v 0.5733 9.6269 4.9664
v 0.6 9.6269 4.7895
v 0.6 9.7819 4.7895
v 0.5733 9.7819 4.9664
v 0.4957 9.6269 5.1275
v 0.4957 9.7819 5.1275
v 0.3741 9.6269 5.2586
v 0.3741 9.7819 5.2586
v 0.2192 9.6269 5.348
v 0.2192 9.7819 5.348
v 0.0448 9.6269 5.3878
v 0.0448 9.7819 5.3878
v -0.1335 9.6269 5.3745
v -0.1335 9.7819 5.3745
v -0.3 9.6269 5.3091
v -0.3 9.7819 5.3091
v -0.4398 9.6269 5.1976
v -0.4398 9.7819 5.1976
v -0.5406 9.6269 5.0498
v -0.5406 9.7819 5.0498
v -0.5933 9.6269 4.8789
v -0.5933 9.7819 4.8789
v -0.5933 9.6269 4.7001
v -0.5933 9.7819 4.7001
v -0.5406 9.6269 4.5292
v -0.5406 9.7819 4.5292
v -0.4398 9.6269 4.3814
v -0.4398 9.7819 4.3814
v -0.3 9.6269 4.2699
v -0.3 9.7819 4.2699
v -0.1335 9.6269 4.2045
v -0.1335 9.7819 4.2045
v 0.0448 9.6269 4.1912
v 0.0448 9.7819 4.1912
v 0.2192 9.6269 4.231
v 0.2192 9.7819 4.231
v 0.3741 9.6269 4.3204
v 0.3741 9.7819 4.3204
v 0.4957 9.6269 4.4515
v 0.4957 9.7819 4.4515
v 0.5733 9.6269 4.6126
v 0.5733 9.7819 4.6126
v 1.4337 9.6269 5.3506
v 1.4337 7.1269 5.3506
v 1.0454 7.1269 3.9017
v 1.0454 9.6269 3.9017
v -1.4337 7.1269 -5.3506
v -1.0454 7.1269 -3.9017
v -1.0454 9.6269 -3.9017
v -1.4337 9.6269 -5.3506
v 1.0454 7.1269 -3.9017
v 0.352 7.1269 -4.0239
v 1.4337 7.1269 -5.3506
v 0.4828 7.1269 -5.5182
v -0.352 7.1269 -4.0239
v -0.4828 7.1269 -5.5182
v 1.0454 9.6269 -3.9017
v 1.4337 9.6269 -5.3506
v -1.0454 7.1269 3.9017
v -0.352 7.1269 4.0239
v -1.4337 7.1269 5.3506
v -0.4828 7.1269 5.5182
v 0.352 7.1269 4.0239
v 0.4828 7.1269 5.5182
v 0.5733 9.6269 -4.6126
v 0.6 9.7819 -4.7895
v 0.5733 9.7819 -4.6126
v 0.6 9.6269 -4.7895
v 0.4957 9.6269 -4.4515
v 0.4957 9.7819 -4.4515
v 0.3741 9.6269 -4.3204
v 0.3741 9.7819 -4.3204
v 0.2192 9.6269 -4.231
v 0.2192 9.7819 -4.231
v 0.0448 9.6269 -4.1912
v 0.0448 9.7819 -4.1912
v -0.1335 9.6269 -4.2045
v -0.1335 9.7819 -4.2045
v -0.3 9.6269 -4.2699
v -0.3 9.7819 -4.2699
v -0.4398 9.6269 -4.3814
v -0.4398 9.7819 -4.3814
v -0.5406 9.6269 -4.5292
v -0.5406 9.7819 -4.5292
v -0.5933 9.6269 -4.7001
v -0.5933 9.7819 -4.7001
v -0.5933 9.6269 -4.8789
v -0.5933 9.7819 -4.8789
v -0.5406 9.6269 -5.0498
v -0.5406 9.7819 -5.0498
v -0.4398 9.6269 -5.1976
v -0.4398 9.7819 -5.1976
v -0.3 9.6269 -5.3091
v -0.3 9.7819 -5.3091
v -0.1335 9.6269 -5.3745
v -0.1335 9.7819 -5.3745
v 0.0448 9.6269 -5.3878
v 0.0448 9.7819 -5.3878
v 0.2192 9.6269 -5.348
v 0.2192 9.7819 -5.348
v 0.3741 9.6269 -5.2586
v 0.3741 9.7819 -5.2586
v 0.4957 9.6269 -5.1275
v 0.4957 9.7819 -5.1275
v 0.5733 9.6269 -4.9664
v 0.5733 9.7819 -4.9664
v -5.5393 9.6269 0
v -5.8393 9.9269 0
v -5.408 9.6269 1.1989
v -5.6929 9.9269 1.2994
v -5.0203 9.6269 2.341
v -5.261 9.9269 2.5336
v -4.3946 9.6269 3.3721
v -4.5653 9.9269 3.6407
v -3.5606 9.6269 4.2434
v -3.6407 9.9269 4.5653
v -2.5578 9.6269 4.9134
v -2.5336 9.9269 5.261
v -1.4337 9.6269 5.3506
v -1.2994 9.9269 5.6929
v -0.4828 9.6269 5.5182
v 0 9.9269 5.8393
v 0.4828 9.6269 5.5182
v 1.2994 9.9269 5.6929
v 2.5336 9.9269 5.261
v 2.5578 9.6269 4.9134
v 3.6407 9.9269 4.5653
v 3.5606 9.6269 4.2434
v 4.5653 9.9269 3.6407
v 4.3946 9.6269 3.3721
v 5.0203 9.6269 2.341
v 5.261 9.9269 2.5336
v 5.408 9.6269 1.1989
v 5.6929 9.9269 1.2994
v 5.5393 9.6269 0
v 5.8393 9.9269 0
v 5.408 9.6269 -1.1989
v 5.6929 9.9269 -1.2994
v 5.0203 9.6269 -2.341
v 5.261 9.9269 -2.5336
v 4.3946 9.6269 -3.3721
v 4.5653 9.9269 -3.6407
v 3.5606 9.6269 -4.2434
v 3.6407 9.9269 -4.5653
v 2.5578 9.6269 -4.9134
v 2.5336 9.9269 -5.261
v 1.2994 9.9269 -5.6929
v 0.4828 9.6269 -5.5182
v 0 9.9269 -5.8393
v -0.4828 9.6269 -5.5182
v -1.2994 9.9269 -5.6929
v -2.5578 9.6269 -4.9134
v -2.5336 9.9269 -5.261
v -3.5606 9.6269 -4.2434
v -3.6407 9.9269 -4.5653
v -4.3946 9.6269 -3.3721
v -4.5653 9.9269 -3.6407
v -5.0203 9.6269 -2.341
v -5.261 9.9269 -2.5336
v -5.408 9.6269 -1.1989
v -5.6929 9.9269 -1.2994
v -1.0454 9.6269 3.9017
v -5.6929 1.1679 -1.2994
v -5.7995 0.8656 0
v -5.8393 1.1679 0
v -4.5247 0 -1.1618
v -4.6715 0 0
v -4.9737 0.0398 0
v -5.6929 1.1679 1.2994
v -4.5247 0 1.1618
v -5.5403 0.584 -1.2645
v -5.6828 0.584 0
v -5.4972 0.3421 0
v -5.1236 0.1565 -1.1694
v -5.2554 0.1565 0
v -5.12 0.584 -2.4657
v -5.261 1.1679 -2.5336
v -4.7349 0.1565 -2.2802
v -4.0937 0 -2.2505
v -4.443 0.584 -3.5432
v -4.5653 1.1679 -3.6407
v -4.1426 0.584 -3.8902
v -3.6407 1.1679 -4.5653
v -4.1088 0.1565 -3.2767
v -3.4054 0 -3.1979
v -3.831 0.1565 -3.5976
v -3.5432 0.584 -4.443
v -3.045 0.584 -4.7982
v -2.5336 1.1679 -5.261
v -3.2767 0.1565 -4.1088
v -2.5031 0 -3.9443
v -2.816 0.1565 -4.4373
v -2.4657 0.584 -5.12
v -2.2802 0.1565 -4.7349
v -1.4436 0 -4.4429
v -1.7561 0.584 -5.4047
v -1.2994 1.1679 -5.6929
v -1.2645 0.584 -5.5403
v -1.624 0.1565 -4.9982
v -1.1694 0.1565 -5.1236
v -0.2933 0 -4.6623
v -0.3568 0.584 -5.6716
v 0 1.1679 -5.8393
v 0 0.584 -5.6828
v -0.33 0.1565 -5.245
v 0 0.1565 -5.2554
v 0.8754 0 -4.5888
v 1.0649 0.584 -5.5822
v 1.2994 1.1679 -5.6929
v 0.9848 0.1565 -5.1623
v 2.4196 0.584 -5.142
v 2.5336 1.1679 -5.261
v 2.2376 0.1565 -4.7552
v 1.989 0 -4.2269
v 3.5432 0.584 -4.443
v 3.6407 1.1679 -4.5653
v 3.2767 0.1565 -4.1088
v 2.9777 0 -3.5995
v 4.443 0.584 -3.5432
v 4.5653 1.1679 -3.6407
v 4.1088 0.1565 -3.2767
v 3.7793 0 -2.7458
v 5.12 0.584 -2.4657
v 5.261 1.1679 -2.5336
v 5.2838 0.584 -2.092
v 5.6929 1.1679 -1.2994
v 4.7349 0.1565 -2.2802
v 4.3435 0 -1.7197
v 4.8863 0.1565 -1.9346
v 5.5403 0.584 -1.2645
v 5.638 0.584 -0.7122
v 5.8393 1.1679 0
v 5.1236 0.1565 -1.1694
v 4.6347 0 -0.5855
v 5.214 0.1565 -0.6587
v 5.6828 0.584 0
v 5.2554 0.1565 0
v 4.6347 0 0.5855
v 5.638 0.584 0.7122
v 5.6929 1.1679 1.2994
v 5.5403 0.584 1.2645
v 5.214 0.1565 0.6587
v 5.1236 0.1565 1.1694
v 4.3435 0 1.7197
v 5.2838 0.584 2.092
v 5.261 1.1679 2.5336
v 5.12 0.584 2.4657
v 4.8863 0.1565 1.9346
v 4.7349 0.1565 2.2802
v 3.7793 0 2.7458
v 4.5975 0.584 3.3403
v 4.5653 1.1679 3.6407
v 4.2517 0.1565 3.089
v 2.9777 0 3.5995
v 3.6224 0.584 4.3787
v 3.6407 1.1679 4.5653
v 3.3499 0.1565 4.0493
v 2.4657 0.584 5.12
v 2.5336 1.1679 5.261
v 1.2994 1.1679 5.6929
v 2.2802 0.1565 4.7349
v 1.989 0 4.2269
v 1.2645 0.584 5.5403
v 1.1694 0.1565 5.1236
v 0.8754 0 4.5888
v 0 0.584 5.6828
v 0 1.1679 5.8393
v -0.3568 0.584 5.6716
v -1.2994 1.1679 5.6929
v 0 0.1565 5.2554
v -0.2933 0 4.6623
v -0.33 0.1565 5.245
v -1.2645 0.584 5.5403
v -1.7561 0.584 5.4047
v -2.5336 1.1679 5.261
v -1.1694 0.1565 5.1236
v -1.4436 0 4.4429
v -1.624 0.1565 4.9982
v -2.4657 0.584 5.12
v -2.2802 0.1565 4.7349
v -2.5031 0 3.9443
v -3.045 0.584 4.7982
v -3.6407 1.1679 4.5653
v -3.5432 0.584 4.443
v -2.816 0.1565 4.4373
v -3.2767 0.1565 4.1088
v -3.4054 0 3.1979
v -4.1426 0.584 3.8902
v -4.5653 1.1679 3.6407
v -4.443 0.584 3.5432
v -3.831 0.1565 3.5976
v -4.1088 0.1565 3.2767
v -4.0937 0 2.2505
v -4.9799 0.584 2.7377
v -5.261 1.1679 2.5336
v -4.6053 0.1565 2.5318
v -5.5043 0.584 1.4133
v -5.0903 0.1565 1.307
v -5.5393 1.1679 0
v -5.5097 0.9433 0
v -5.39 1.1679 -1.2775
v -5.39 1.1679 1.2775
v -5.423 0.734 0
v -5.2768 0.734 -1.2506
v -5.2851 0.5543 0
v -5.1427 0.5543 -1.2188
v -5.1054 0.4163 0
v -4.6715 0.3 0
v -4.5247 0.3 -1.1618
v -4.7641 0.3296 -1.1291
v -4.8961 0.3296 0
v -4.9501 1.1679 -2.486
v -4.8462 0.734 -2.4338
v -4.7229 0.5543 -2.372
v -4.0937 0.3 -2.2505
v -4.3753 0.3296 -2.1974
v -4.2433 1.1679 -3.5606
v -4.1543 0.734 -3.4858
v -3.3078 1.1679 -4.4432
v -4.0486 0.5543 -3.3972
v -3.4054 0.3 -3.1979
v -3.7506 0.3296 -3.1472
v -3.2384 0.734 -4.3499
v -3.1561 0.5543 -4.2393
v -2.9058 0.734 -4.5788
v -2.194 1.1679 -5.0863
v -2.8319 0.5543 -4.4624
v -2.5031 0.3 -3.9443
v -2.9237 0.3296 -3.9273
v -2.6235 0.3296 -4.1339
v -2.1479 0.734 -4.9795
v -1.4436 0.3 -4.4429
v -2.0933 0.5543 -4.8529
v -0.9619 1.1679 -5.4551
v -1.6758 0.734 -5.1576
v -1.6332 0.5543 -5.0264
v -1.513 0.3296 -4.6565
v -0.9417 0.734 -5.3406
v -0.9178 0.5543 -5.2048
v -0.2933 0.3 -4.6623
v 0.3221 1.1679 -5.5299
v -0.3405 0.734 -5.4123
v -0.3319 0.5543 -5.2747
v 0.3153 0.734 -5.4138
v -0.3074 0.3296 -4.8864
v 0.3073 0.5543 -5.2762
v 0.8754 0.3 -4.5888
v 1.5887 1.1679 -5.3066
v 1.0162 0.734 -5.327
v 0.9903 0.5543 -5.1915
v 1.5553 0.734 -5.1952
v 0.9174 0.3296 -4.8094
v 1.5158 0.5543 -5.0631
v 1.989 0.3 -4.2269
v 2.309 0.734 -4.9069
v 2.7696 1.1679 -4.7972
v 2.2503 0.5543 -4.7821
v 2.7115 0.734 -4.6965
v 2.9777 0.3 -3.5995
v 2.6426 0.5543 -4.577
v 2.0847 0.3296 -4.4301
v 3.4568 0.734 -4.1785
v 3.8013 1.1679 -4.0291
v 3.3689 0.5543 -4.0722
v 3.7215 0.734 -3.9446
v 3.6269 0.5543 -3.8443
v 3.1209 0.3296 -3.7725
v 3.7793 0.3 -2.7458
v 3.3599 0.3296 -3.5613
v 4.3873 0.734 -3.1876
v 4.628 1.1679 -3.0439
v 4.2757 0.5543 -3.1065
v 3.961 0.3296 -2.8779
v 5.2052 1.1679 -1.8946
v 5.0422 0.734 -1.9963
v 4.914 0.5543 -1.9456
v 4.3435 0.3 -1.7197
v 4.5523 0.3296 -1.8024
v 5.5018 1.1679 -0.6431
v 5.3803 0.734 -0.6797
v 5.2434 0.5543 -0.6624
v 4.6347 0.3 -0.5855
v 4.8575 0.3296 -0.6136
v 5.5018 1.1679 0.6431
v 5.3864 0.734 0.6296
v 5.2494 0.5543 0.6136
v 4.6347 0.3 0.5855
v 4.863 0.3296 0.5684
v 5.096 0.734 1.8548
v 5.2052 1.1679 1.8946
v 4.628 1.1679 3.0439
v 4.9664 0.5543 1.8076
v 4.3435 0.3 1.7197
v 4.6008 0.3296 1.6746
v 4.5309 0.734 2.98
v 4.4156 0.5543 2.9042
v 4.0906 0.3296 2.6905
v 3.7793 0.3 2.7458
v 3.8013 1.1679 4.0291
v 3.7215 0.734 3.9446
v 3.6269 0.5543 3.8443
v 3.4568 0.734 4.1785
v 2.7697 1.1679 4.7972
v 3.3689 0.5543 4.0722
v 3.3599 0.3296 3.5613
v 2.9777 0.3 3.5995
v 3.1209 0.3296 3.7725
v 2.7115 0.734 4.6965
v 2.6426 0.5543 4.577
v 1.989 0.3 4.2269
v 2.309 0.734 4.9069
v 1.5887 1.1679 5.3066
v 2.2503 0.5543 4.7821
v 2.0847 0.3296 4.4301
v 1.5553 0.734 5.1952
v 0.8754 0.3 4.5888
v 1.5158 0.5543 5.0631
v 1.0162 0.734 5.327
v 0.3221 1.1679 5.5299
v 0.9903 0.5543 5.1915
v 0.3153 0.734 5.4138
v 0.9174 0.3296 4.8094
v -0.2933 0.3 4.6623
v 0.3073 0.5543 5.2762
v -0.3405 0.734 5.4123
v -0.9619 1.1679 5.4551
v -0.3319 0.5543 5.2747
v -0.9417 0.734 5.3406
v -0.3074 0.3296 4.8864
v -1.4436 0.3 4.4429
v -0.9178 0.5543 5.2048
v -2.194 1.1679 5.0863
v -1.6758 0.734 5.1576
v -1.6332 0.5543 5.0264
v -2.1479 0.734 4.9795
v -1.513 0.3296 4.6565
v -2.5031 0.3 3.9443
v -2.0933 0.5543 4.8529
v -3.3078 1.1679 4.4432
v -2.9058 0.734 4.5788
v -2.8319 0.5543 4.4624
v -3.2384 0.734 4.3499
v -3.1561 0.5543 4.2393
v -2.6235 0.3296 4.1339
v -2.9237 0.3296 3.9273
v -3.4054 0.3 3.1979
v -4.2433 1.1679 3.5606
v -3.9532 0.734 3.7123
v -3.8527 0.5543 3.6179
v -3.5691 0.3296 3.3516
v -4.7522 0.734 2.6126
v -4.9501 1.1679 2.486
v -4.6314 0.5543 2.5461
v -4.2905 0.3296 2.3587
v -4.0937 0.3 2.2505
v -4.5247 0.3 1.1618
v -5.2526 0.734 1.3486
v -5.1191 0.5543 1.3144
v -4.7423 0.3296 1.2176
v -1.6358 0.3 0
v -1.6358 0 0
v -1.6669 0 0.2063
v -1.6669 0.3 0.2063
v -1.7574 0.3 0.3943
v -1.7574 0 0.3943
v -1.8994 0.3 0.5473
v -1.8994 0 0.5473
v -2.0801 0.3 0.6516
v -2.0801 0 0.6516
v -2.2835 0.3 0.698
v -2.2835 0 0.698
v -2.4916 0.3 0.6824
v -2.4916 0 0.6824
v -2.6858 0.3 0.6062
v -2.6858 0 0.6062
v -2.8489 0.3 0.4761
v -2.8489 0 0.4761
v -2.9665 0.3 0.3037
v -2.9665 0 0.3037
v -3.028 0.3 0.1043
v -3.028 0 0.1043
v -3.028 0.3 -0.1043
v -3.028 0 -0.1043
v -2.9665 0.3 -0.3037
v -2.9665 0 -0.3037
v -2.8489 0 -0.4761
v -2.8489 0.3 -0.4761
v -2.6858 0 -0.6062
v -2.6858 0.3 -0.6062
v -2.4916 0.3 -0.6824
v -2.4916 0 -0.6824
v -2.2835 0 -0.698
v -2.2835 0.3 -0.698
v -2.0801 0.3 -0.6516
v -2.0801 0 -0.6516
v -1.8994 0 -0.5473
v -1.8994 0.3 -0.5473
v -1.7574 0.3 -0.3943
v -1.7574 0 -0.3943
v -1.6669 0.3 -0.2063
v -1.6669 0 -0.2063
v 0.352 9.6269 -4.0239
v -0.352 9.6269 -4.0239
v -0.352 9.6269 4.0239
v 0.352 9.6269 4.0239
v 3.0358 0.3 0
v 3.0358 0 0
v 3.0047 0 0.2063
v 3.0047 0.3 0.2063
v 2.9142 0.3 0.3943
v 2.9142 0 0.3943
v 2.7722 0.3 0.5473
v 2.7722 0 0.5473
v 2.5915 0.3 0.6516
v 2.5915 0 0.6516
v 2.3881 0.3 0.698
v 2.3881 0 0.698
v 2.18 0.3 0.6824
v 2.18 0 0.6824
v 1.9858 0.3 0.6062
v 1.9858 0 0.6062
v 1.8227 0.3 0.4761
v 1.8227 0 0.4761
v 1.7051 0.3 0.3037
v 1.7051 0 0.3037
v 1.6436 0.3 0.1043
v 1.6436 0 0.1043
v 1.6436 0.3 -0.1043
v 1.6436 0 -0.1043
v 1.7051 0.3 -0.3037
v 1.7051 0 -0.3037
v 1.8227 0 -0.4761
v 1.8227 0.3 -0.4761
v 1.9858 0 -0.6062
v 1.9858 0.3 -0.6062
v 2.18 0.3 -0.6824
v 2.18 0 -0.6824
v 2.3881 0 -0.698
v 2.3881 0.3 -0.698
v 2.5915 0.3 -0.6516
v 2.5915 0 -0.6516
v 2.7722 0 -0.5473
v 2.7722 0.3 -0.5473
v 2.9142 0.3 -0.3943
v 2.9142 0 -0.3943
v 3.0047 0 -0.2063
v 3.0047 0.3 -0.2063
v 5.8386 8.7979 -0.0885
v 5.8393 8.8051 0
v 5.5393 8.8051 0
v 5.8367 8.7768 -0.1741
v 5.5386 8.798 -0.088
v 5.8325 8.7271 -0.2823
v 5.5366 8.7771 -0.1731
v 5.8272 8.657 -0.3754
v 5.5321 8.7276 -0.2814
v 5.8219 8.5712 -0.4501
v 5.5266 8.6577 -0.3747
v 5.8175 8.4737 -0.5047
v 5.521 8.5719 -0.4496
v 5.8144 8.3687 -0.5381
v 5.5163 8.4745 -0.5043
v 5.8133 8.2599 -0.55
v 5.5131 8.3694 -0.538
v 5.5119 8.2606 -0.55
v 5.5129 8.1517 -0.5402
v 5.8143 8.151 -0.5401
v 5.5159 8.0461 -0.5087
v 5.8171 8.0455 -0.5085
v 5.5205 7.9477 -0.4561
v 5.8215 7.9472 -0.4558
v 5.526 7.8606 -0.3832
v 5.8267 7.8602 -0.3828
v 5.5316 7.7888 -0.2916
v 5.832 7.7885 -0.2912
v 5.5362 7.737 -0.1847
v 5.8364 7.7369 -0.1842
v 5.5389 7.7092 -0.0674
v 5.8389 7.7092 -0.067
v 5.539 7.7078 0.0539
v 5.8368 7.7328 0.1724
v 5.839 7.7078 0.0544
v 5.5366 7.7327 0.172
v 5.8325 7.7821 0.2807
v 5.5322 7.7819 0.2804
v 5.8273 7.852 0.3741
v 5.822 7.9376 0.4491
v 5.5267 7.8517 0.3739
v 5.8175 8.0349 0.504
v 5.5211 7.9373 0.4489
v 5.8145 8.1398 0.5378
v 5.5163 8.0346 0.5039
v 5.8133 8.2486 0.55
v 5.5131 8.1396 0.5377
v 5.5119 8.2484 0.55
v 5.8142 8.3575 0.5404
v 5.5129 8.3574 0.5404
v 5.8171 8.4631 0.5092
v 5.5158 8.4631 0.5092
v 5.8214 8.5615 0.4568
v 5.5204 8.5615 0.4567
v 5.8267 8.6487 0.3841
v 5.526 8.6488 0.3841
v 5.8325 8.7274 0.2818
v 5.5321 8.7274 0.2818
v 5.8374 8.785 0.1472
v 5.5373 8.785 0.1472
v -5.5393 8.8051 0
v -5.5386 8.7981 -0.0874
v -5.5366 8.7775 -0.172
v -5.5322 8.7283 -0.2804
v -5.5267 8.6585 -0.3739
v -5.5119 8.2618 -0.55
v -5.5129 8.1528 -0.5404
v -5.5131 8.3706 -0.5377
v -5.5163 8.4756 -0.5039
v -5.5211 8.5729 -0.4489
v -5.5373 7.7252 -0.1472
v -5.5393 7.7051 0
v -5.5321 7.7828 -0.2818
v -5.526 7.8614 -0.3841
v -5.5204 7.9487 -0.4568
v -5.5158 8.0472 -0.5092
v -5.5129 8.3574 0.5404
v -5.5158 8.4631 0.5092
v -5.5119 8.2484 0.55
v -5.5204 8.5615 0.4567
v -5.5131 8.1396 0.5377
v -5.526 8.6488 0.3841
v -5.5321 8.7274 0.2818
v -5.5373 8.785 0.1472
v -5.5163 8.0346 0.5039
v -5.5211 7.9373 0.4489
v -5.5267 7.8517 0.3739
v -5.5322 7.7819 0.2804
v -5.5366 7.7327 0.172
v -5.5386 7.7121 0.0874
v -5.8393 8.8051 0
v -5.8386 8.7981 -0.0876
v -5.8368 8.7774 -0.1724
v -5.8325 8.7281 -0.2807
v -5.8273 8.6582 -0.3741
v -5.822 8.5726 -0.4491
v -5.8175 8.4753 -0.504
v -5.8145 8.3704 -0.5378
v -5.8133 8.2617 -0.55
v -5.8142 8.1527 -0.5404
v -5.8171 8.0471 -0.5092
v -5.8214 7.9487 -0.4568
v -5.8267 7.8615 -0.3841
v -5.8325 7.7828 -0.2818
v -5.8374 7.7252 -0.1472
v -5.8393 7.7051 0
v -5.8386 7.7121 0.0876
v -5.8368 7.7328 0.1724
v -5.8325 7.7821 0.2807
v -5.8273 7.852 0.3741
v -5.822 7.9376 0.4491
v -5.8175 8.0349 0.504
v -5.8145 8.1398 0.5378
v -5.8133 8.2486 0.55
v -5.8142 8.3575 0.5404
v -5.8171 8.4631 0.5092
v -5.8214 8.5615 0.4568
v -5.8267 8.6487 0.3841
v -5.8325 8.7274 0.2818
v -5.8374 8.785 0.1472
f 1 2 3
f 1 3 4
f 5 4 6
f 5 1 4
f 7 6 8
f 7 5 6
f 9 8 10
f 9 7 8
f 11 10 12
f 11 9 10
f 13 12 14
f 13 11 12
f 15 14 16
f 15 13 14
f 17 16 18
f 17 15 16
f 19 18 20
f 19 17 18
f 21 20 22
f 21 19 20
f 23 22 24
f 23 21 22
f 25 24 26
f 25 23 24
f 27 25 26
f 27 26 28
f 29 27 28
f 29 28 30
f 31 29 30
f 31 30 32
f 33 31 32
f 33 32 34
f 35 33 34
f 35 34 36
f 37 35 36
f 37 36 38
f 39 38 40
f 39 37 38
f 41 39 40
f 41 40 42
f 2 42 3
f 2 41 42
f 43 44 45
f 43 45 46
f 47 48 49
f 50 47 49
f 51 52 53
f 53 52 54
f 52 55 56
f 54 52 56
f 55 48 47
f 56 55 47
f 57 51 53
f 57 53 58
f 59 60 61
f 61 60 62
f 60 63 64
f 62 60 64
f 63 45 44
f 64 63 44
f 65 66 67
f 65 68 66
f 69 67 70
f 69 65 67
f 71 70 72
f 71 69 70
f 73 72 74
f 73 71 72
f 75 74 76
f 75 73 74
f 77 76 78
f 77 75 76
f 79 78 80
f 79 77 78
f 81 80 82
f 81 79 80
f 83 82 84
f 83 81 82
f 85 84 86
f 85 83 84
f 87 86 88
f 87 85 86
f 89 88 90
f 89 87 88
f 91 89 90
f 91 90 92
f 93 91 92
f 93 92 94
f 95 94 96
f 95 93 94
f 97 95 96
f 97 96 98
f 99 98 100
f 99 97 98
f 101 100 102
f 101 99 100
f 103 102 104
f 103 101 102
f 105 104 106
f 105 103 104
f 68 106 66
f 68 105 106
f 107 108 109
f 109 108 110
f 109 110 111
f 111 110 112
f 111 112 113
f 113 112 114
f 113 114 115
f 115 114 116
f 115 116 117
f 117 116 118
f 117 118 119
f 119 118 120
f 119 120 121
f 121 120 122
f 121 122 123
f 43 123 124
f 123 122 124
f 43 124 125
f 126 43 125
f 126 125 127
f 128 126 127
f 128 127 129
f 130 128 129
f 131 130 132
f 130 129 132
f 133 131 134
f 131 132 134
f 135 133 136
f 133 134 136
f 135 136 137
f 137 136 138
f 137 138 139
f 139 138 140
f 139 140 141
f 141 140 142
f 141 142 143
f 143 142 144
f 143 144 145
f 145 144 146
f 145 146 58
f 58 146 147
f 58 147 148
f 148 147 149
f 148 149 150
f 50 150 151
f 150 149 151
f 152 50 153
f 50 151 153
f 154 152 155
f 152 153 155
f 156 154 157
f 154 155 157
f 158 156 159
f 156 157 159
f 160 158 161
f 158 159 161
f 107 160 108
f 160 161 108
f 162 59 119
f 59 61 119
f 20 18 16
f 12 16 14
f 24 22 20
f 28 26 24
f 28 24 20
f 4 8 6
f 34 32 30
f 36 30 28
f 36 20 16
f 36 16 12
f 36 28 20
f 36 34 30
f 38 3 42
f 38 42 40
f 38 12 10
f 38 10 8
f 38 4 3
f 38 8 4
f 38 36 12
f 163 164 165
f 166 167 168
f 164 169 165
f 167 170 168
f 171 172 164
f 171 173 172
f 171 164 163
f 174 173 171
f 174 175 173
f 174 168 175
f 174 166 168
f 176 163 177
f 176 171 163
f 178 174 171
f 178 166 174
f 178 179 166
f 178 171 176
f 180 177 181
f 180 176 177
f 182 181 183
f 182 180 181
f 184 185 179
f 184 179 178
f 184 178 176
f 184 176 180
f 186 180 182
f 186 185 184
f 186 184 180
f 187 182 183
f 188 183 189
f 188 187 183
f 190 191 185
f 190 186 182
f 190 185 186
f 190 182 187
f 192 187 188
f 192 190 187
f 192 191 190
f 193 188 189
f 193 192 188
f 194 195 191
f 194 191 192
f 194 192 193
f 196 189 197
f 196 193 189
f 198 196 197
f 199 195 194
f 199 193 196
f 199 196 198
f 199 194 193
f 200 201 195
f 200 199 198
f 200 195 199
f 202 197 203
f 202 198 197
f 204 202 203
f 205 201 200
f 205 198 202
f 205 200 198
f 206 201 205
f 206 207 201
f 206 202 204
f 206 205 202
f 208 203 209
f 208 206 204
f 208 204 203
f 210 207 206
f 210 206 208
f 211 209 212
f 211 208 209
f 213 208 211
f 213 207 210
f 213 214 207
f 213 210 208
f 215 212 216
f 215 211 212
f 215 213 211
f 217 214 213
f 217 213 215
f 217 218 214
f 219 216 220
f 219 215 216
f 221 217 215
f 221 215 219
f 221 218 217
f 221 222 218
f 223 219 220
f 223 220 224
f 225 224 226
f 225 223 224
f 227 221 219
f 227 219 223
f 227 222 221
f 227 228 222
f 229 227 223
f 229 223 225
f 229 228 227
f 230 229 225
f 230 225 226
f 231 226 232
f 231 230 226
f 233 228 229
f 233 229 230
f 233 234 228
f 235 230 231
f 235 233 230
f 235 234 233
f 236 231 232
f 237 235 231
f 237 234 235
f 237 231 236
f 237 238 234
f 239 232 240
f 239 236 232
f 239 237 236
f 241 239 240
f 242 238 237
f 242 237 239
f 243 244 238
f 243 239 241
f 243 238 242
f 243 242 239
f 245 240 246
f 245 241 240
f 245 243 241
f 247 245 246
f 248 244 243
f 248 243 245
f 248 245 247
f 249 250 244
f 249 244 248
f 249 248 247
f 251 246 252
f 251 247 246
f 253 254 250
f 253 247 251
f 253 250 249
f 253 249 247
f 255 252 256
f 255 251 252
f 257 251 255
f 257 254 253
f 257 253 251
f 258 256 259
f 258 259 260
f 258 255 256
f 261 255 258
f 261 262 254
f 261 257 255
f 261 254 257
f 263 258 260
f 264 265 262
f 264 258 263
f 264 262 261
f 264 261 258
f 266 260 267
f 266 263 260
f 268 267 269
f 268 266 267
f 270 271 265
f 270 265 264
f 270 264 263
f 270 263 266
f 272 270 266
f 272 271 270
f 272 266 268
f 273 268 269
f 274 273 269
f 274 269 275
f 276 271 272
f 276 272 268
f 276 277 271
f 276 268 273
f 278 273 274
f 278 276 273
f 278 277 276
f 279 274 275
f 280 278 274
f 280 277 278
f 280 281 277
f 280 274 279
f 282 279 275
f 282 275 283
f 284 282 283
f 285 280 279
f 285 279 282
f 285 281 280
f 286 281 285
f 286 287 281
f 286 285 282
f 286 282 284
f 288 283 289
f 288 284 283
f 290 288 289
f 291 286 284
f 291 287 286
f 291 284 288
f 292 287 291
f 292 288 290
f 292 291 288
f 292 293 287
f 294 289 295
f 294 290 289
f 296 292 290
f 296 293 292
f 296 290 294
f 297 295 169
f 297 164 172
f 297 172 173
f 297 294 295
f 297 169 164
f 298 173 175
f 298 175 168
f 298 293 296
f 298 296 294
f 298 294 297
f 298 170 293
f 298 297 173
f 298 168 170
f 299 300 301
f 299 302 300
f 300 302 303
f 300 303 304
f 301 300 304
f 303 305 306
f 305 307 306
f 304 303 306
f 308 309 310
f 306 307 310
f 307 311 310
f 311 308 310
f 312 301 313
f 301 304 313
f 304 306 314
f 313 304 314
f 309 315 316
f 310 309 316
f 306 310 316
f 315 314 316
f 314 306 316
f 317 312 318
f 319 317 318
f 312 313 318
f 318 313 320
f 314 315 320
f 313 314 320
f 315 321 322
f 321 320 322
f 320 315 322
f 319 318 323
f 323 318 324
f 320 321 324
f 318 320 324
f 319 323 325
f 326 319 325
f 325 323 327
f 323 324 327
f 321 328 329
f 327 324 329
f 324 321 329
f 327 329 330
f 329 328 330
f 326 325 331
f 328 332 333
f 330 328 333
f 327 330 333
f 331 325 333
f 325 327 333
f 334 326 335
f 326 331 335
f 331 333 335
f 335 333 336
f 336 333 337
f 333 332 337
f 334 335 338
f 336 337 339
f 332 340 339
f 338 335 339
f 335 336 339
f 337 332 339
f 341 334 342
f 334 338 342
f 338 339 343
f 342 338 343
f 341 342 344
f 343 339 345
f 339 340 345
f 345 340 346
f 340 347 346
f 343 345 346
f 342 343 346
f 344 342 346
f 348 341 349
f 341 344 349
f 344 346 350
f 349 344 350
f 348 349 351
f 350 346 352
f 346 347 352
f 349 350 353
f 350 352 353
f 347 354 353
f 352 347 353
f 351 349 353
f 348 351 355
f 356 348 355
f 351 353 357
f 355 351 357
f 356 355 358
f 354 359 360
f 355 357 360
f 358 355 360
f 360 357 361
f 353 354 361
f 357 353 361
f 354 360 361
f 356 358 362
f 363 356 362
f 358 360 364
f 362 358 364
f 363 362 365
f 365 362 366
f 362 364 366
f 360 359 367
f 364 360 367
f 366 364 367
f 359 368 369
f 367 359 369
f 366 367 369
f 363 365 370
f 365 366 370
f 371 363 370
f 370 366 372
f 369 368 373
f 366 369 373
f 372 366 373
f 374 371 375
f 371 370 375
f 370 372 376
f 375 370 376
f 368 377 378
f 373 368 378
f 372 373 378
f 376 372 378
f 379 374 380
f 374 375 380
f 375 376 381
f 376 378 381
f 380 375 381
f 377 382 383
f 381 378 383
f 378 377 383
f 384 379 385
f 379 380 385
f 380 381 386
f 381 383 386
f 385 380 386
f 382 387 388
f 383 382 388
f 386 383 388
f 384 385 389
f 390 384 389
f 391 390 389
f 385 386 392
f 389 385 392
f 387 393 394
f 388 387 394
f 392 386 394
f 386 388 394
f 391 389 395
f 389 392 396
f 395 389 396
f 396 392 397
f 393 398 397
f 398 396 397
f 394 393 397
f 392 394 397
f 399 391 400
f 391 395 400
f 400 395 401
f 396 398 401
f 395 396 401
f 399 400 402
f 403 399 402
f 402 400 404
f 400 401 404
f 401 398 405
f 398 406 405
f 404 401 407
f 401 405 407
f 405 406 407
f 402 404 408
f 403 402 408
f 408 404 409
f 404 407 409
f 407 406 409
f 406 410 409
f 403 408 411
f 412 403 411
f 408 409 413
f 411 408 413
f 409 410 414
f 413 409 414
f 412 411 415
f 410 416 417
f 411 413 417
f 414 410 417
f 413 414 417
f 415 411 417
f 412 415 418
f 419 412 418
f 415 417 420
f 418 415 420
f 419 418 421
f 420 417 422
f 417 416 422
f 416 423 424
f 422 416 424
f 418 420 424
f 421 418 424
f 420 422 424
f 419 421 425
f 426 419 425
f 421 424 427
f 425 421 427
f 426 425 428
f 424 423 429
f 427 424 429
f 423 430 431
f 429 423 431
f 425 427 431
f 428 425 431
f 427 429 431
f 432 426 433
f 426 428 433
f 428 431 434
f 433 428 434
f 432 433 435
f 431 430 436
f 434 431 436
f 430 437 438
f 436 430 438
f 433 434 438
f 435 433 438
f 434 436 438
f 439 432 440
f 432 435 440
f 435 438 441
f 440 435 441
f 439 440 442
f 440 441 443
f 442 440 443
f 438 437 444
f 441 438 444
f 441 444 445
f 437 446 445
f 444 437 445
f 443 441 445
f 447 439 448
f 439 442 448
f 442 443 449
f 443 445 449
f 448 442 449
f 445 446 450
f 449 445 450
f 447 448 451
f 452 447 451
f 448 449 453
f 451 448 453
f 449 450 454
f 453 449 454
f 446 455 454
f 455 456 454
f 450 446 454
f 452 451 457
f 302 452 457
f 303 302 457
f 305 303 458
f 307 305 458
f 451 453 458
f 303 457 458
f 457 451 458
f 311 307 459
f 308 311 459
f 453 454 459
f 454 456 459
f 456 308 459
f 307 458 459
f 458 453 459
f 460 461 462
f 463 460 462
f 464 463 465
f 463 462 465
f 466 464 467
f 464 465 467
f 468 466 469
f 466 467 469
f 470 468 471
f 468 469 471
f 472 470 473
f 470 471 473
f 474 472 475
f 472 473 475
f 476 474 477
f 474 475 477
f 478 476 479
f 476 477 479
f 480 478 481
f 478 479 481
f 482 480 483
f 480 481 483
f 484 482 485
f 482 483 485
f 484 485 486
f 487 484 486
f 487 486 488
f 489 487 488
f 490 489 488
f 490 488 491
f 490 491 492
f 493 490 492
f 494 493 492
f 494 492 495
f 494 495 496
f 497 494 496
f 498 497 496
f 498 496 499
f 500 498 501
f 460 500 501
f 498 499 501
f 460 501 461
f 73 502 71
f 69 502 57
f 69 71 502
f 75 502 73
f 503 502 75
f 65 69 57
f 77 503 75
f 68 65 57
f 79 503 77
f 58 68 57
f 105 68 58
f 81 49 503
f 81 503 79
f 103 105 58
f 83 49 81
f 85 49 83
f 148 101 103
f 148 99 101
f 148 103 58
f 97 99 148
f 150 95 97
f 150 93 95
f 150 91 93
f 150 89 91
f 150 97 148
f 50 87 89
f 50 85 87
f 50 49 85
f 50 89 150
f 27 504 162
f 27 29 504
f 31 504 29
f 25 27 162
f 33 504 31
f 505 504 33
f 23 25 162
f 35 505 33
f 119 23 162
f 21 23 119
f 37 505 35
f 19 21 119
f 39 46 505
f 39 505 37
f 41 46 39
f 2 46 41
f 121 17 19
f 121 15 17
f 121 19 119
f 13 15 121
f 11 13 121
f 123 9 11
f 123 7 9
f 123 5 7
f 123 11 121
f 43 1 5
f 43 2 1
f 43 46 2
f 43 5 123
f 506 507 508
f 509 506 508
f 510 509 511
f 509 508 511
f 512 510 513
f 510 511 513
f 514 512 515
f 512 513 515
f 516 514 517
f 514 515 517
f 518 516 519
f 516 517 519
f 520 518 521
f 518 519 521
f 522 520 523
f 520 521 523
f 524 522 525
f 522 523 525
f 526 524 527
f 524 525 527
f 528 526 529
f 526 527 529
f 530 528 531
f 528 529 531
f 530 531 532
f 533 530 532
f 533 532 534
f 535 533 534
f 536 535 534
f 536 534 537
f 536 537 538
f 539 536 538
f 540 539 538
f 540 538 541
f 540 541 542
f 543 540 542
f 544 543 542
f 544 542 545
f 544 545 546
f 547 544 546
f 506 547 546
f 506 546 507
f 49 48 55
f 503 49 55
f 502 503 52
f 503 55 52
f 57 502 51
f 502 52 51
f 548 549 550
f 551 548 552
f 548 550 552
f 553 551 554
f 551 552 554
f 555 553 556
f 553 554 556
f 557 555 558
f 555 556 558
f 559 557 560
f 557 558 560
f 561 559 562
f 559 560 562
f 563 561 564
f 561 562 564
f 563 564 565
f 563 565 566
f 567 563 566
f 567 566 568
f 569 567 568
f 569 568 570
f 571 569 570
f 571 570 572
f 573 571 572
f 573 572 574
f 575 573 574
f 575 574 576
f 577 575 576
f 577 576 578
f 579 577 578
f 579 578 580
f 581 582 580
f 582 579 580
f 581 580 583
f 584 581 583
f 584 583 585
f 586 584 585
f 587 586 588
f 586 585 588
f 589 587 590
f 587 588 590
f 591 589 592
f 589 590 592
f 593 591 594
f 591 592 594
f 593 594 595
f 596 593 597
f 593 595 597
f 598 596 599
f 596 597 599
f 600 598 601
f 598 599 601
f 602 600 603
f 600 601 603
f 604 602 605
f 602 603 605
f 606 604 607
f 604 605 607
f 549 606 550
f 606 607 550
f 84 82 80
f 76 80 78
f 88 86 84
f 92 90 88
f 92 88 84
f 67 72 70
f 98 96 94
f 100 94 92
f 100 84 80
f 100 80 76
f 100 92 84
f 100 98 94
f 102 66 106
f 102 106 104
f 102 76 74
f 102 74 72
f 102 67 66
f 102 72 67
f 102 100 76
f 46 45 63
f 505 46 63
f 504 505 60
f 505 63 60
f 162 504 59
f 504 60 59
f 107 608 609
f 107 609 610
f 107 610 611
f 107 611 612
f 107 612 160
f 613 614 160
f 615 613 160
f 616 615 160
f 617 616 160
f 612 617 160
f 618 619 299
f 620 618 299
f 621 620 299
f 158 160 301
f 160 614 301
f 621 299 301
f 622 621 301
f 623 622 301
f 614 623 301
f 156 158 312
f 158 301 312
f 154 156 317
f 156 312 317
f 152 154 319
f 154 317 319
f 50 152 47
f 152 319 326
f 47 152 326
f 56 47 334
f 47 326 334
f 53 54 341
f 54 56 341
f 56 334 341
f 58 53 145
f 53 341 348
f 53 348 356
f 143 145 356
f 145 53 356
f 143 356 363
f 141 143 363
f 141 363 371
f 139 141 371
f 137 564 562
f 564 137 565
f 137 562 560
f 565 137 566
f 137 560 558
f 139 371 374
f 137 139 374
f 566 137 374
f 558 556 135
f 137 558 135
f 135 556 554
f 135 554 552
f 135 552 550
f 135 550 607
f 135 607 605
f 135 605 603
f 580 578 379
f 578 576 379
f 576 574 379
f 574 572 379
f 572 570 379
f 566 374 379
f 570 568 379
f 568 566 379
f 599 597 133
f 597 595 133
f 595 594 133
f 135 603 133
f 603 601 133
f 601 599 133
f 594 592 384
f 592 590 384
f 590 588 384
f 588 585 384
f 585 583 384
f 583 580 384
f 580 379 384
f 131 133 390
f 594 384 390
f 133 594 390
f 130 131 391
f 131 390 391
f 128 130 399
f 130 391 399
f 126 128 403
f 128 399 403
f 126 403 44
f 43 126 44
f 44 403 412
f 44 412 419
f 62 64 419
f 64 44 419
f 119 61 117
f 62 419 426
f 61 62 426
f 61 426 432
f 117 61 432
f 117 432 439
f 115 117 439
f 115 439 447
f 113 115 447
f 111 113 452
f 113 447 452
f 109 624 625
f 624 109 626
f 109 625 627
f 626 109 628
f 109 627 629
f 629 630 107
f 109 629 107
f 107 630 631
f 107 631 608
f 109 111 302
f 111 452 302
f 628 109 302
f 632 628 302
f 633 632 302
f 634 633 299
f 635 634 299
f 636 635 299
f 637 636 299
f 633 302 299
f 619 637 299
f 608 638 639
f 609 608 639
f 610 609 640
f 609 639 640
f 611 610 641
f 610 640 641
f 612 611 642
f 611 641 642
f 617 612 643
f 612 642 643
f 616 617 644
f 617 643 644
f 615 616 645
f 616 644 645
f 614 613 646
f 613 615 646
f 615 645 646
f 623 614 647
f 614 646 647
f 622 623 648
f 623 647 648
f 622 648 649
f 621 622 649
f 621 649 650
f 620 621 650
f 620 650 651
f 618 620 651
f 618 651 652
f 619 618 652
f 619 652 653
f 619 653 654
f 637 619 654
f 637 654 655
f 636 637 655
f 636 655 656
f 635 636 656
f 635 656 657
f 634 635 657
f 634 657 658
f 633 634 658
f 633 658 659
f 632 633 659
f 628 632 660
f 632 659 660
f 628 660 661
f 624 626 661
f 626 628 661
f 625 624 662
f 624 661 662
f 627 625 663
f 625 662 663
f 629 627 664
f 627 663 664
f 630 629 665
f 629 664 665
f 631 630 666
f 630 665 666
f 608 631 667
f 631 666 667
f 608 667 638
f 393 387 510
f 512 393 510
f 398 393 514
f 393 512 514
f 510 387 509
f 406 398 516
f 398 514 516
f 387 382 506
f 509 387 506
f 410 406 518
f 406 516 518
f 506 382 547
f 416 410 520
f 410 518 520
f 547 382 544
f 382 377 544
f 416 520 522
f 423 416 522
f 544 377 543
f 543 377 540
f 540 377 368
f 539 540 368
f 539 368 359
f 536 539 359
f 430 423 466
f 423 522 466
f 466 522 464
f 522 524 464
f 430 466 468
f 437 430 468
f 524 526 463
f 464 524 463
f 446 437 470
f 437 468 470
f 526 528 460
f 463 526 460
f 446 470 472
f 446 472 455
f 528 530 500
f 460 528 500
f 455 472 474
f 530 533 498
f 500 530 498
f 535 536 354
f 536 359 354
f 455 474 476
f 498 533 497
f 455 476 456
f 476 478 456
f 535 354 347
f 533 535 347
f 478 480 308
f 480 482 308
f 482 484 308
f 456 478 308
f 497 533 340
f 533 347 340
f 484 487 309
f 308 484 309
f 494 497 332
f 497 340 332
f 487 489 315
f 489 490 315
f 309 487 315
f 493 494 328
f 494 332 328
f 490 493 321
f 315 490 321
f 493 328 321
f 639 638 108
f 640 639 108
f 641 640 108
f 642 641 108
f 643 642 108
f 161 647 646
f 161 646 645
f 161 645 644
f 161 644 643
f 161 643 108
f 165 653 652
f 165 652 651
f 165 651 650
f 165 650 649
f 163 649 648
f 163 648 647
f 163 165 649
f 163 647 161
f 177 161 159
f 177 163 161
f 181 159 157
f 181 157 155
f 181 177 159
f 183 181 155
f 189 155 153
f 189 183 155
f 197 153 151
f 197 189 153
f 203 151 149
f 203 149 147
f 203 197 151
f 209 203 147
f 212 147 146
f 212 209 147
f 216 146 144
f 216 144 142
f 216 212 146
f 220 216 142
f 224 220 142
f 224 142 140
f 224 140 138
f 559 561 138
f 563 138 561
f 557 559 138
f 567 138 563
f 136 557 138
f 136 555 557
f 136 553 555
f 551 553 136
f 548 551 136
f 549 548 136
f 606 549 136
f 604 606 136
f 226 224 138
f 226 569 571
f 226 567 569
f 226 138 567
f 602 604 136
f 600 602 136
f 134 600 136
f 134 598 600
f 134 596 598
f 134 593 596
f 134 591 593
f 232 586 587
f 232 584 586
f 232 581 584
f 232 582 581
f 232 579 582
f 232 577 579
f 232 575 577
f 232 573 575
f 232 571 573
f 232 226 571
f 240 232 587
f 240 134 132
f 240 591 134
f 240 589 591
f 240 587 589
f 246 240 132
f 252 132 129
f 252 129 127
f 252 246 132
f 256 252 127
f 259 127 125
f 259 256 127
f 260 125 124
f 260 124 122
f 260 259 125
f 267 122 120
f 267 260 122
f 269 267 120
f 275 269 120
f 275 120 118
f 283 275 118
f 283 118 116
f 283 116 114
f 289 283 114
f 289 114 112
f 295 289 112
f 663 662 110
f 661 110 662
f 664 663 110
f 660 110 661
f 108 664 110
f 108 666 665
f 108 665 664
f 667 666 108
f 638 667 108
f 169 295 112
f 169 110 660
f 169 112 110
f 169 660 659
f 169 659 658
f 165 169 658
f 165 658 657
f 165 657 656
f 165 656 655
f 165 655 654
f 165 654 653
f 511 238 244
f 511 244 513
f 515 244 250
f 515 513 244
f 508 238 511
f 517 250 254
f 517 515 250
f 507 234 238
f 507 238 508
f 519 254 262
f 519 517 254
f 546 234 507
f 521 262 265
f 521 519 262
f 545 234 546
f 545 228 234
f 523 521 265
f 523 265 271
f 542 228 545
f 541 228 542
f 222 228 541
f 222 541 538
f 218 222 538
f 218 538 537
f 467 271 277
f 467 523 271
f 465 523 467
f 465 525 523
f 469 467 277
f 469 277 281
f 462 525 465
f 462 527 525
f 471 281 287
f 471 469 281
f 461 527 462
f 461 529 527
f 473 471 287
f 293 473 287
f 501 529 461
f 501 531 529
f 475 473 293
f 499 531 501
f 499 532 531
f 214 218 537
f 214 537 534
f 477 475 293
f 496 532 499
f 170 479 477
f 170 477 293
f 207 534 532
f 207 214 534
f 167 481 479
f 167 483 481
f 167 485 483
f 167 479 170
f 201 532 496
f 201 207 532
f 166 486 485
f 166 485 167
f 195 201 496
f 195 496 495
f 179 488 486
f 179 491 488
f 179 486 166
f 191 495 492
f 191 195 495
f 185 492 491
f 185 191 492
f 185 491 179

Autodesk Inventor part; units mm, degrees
ref_plane "XZ Plane" through (0, 0, 0) normal (0, 1, 0) x (-1, 0, 0)
ref_plane "XY Plane" through (0, 0, 0) normal (0, 0, 1) x (1, 0, 0)
sketch "Boceto1" plane through (0, 0, 0) normal (0, 0, 1) x (1, 0, 0)
  line L0 (0, 0) -> (-4.6715, 0)
  line L1 (-5.8393, 9.9269) -> (-5.8393, 1.1679)
  line L2 (-5.5393, 9.6269) -> (-5.5393, 1.1679)
  arc A0 (-5.8393, 1.1679) -> (-4.6715, 0) centre (-4.6715, 1.1679) ccw
  arc A1 (-5.5393, 1.1679) -> (-4.6715, 0.3) centre (-4.6715, 1.1679) ccw
  line L3 (0, 0) -> (-4.6715, 0)
  line L4 (0, 0.3) -> (-4.6715, 0.3)
  line L5 (0, 0.3) -> (0, 0)
  line L6 (-5.8393, 9.9269) -> (-5.5393, 9.6269)
revolve "Revolución1" add sketch "Boceto1" angle 360 about axis through (0, 0.3, 0) along (0, -1, 0)
sketch "Boceto2" plane through (0, 0, 0) normal (1, 0, 0) x (0, 1, 0)
  line L0 (9.6269, 5.5393) -> (1.1679, 5.5393) projected
  line L1 (9.6269, -5.5393) -> (1.1679, -5.5393) projected
  line L2 (9.6269, 5.5393) -> (9.6269, 4.0393)
  line L3 (9.6269, -5.5393) -> (9.6269, 5.5393) projected
  line L4 (9.6269, 4.0393) -> (7.1269, 4.0393)
  line L5 (7.1269, 4.0393) -> (7.1269, 5.5393)
  line L6 (9.6269, 5.5393) -> (7.1269, 5.5393)
  line L7 (9.6269, 0) -> (13.8106, 0)
  line L8 (9.6269, -5.5393) -> (9.6269, -4.0393)
  line L9 (9.6269, -4.0393) -> (7.1269, -4.0393)
  line L10 (7.1269, -4.0393) -> (7.1269, -5.5393)
  point P0 (0, 0)
  dimension "d1" = 1.5
  dimension "d2" = 2.5
  dimension "d3" = 1.5
  dimension "d4" = 2.5
revolve "Revolución2" add sketch "Boceto2" angle 30 mid plane about axis through (0, 9.6269, 0) along (0, 1, 0)
sketch "Boceto3" plane through (0, 9.6269, 0) normal (0, 1, 0) x (1, 0, 0)
  line L0 (-1.0455, -3.9017) -> (-1.4337, -5.3506) projected
  arc A0 (-1.4337, -5.3506) -> (1.4337, -5.3506) centre (0, 0) ccw projected
  line L1 (1.0455, -3.9017) -> (1.4337, -5.3506) projected
  arc A1 (-1.0455, -3.9017) -> (1.0455, -3.9017) centre (0, 0) ccw projected
  line L2 (1.4337, 5.3506) -> (1.0455, 3.9017) projected
  arc A2 (1.4337, 5.3506) -> (-1.4337, 5.3506) centre (0, 0) ccw projected
  line L3 (-1.0455, 3.9017) -> (-1.4337, 5.3506) projected
  arc A3 (1.0455, 3.9017) -> (-1.0455, 3.9017) centre (0, 0) ccw projected
  circle A4 centre (0, 4.7895) radius 0.6
  circle A5 centre (0, -4.7895) radius 0.6
  dimension "d9" = 1.2
  dimension "d10" = 1.2
extrude "Extrusión1" add sketch "Boceto3" along normal blind 0.155 contours A4 | A5
ref_plane "Plano de trabajo1" through (-8, 0, 0) normal (1, 0, 0) x (0, 1, 0)
sketch "Boceto6" plane through (-8, 0, 0) normal (1, 0, 0) x (0, 1, 0)
  line L0 (1.1679, -5.8393) -> (1.1679, 5.8393) projected
  line L1 (9.9269, -5.8393) -> (9.9269, 5.8393) projected
  line L2 (0, -4.6715) -> (0, 4.6715) projected
  line L3 (1.1679, -5.8393) -> (1.1679, 5.8393) projected
  circle A0 centre (8.2551, 0) radius 0.55
  point P0 (0, 0)
extrude "Extrusión2" cut sketch "Boceto6" along normal blind 16
sketch "Boceto7" plane through (0, 0, 0) normal (0, -1, 0) x (1, 0, 0)
  circle A0 centre (-2.3358, 0) radius 0.7
  circle A1 centre (2.3358, 0) radius 0.7
  point P0 (0, 0)
  dimension "d17" = 1.4
  dimension "d18" = 1.4
extrude "Extrusión3" cut sketch "Boceto7" against normal blind 3
properties part number "cuerpo"
